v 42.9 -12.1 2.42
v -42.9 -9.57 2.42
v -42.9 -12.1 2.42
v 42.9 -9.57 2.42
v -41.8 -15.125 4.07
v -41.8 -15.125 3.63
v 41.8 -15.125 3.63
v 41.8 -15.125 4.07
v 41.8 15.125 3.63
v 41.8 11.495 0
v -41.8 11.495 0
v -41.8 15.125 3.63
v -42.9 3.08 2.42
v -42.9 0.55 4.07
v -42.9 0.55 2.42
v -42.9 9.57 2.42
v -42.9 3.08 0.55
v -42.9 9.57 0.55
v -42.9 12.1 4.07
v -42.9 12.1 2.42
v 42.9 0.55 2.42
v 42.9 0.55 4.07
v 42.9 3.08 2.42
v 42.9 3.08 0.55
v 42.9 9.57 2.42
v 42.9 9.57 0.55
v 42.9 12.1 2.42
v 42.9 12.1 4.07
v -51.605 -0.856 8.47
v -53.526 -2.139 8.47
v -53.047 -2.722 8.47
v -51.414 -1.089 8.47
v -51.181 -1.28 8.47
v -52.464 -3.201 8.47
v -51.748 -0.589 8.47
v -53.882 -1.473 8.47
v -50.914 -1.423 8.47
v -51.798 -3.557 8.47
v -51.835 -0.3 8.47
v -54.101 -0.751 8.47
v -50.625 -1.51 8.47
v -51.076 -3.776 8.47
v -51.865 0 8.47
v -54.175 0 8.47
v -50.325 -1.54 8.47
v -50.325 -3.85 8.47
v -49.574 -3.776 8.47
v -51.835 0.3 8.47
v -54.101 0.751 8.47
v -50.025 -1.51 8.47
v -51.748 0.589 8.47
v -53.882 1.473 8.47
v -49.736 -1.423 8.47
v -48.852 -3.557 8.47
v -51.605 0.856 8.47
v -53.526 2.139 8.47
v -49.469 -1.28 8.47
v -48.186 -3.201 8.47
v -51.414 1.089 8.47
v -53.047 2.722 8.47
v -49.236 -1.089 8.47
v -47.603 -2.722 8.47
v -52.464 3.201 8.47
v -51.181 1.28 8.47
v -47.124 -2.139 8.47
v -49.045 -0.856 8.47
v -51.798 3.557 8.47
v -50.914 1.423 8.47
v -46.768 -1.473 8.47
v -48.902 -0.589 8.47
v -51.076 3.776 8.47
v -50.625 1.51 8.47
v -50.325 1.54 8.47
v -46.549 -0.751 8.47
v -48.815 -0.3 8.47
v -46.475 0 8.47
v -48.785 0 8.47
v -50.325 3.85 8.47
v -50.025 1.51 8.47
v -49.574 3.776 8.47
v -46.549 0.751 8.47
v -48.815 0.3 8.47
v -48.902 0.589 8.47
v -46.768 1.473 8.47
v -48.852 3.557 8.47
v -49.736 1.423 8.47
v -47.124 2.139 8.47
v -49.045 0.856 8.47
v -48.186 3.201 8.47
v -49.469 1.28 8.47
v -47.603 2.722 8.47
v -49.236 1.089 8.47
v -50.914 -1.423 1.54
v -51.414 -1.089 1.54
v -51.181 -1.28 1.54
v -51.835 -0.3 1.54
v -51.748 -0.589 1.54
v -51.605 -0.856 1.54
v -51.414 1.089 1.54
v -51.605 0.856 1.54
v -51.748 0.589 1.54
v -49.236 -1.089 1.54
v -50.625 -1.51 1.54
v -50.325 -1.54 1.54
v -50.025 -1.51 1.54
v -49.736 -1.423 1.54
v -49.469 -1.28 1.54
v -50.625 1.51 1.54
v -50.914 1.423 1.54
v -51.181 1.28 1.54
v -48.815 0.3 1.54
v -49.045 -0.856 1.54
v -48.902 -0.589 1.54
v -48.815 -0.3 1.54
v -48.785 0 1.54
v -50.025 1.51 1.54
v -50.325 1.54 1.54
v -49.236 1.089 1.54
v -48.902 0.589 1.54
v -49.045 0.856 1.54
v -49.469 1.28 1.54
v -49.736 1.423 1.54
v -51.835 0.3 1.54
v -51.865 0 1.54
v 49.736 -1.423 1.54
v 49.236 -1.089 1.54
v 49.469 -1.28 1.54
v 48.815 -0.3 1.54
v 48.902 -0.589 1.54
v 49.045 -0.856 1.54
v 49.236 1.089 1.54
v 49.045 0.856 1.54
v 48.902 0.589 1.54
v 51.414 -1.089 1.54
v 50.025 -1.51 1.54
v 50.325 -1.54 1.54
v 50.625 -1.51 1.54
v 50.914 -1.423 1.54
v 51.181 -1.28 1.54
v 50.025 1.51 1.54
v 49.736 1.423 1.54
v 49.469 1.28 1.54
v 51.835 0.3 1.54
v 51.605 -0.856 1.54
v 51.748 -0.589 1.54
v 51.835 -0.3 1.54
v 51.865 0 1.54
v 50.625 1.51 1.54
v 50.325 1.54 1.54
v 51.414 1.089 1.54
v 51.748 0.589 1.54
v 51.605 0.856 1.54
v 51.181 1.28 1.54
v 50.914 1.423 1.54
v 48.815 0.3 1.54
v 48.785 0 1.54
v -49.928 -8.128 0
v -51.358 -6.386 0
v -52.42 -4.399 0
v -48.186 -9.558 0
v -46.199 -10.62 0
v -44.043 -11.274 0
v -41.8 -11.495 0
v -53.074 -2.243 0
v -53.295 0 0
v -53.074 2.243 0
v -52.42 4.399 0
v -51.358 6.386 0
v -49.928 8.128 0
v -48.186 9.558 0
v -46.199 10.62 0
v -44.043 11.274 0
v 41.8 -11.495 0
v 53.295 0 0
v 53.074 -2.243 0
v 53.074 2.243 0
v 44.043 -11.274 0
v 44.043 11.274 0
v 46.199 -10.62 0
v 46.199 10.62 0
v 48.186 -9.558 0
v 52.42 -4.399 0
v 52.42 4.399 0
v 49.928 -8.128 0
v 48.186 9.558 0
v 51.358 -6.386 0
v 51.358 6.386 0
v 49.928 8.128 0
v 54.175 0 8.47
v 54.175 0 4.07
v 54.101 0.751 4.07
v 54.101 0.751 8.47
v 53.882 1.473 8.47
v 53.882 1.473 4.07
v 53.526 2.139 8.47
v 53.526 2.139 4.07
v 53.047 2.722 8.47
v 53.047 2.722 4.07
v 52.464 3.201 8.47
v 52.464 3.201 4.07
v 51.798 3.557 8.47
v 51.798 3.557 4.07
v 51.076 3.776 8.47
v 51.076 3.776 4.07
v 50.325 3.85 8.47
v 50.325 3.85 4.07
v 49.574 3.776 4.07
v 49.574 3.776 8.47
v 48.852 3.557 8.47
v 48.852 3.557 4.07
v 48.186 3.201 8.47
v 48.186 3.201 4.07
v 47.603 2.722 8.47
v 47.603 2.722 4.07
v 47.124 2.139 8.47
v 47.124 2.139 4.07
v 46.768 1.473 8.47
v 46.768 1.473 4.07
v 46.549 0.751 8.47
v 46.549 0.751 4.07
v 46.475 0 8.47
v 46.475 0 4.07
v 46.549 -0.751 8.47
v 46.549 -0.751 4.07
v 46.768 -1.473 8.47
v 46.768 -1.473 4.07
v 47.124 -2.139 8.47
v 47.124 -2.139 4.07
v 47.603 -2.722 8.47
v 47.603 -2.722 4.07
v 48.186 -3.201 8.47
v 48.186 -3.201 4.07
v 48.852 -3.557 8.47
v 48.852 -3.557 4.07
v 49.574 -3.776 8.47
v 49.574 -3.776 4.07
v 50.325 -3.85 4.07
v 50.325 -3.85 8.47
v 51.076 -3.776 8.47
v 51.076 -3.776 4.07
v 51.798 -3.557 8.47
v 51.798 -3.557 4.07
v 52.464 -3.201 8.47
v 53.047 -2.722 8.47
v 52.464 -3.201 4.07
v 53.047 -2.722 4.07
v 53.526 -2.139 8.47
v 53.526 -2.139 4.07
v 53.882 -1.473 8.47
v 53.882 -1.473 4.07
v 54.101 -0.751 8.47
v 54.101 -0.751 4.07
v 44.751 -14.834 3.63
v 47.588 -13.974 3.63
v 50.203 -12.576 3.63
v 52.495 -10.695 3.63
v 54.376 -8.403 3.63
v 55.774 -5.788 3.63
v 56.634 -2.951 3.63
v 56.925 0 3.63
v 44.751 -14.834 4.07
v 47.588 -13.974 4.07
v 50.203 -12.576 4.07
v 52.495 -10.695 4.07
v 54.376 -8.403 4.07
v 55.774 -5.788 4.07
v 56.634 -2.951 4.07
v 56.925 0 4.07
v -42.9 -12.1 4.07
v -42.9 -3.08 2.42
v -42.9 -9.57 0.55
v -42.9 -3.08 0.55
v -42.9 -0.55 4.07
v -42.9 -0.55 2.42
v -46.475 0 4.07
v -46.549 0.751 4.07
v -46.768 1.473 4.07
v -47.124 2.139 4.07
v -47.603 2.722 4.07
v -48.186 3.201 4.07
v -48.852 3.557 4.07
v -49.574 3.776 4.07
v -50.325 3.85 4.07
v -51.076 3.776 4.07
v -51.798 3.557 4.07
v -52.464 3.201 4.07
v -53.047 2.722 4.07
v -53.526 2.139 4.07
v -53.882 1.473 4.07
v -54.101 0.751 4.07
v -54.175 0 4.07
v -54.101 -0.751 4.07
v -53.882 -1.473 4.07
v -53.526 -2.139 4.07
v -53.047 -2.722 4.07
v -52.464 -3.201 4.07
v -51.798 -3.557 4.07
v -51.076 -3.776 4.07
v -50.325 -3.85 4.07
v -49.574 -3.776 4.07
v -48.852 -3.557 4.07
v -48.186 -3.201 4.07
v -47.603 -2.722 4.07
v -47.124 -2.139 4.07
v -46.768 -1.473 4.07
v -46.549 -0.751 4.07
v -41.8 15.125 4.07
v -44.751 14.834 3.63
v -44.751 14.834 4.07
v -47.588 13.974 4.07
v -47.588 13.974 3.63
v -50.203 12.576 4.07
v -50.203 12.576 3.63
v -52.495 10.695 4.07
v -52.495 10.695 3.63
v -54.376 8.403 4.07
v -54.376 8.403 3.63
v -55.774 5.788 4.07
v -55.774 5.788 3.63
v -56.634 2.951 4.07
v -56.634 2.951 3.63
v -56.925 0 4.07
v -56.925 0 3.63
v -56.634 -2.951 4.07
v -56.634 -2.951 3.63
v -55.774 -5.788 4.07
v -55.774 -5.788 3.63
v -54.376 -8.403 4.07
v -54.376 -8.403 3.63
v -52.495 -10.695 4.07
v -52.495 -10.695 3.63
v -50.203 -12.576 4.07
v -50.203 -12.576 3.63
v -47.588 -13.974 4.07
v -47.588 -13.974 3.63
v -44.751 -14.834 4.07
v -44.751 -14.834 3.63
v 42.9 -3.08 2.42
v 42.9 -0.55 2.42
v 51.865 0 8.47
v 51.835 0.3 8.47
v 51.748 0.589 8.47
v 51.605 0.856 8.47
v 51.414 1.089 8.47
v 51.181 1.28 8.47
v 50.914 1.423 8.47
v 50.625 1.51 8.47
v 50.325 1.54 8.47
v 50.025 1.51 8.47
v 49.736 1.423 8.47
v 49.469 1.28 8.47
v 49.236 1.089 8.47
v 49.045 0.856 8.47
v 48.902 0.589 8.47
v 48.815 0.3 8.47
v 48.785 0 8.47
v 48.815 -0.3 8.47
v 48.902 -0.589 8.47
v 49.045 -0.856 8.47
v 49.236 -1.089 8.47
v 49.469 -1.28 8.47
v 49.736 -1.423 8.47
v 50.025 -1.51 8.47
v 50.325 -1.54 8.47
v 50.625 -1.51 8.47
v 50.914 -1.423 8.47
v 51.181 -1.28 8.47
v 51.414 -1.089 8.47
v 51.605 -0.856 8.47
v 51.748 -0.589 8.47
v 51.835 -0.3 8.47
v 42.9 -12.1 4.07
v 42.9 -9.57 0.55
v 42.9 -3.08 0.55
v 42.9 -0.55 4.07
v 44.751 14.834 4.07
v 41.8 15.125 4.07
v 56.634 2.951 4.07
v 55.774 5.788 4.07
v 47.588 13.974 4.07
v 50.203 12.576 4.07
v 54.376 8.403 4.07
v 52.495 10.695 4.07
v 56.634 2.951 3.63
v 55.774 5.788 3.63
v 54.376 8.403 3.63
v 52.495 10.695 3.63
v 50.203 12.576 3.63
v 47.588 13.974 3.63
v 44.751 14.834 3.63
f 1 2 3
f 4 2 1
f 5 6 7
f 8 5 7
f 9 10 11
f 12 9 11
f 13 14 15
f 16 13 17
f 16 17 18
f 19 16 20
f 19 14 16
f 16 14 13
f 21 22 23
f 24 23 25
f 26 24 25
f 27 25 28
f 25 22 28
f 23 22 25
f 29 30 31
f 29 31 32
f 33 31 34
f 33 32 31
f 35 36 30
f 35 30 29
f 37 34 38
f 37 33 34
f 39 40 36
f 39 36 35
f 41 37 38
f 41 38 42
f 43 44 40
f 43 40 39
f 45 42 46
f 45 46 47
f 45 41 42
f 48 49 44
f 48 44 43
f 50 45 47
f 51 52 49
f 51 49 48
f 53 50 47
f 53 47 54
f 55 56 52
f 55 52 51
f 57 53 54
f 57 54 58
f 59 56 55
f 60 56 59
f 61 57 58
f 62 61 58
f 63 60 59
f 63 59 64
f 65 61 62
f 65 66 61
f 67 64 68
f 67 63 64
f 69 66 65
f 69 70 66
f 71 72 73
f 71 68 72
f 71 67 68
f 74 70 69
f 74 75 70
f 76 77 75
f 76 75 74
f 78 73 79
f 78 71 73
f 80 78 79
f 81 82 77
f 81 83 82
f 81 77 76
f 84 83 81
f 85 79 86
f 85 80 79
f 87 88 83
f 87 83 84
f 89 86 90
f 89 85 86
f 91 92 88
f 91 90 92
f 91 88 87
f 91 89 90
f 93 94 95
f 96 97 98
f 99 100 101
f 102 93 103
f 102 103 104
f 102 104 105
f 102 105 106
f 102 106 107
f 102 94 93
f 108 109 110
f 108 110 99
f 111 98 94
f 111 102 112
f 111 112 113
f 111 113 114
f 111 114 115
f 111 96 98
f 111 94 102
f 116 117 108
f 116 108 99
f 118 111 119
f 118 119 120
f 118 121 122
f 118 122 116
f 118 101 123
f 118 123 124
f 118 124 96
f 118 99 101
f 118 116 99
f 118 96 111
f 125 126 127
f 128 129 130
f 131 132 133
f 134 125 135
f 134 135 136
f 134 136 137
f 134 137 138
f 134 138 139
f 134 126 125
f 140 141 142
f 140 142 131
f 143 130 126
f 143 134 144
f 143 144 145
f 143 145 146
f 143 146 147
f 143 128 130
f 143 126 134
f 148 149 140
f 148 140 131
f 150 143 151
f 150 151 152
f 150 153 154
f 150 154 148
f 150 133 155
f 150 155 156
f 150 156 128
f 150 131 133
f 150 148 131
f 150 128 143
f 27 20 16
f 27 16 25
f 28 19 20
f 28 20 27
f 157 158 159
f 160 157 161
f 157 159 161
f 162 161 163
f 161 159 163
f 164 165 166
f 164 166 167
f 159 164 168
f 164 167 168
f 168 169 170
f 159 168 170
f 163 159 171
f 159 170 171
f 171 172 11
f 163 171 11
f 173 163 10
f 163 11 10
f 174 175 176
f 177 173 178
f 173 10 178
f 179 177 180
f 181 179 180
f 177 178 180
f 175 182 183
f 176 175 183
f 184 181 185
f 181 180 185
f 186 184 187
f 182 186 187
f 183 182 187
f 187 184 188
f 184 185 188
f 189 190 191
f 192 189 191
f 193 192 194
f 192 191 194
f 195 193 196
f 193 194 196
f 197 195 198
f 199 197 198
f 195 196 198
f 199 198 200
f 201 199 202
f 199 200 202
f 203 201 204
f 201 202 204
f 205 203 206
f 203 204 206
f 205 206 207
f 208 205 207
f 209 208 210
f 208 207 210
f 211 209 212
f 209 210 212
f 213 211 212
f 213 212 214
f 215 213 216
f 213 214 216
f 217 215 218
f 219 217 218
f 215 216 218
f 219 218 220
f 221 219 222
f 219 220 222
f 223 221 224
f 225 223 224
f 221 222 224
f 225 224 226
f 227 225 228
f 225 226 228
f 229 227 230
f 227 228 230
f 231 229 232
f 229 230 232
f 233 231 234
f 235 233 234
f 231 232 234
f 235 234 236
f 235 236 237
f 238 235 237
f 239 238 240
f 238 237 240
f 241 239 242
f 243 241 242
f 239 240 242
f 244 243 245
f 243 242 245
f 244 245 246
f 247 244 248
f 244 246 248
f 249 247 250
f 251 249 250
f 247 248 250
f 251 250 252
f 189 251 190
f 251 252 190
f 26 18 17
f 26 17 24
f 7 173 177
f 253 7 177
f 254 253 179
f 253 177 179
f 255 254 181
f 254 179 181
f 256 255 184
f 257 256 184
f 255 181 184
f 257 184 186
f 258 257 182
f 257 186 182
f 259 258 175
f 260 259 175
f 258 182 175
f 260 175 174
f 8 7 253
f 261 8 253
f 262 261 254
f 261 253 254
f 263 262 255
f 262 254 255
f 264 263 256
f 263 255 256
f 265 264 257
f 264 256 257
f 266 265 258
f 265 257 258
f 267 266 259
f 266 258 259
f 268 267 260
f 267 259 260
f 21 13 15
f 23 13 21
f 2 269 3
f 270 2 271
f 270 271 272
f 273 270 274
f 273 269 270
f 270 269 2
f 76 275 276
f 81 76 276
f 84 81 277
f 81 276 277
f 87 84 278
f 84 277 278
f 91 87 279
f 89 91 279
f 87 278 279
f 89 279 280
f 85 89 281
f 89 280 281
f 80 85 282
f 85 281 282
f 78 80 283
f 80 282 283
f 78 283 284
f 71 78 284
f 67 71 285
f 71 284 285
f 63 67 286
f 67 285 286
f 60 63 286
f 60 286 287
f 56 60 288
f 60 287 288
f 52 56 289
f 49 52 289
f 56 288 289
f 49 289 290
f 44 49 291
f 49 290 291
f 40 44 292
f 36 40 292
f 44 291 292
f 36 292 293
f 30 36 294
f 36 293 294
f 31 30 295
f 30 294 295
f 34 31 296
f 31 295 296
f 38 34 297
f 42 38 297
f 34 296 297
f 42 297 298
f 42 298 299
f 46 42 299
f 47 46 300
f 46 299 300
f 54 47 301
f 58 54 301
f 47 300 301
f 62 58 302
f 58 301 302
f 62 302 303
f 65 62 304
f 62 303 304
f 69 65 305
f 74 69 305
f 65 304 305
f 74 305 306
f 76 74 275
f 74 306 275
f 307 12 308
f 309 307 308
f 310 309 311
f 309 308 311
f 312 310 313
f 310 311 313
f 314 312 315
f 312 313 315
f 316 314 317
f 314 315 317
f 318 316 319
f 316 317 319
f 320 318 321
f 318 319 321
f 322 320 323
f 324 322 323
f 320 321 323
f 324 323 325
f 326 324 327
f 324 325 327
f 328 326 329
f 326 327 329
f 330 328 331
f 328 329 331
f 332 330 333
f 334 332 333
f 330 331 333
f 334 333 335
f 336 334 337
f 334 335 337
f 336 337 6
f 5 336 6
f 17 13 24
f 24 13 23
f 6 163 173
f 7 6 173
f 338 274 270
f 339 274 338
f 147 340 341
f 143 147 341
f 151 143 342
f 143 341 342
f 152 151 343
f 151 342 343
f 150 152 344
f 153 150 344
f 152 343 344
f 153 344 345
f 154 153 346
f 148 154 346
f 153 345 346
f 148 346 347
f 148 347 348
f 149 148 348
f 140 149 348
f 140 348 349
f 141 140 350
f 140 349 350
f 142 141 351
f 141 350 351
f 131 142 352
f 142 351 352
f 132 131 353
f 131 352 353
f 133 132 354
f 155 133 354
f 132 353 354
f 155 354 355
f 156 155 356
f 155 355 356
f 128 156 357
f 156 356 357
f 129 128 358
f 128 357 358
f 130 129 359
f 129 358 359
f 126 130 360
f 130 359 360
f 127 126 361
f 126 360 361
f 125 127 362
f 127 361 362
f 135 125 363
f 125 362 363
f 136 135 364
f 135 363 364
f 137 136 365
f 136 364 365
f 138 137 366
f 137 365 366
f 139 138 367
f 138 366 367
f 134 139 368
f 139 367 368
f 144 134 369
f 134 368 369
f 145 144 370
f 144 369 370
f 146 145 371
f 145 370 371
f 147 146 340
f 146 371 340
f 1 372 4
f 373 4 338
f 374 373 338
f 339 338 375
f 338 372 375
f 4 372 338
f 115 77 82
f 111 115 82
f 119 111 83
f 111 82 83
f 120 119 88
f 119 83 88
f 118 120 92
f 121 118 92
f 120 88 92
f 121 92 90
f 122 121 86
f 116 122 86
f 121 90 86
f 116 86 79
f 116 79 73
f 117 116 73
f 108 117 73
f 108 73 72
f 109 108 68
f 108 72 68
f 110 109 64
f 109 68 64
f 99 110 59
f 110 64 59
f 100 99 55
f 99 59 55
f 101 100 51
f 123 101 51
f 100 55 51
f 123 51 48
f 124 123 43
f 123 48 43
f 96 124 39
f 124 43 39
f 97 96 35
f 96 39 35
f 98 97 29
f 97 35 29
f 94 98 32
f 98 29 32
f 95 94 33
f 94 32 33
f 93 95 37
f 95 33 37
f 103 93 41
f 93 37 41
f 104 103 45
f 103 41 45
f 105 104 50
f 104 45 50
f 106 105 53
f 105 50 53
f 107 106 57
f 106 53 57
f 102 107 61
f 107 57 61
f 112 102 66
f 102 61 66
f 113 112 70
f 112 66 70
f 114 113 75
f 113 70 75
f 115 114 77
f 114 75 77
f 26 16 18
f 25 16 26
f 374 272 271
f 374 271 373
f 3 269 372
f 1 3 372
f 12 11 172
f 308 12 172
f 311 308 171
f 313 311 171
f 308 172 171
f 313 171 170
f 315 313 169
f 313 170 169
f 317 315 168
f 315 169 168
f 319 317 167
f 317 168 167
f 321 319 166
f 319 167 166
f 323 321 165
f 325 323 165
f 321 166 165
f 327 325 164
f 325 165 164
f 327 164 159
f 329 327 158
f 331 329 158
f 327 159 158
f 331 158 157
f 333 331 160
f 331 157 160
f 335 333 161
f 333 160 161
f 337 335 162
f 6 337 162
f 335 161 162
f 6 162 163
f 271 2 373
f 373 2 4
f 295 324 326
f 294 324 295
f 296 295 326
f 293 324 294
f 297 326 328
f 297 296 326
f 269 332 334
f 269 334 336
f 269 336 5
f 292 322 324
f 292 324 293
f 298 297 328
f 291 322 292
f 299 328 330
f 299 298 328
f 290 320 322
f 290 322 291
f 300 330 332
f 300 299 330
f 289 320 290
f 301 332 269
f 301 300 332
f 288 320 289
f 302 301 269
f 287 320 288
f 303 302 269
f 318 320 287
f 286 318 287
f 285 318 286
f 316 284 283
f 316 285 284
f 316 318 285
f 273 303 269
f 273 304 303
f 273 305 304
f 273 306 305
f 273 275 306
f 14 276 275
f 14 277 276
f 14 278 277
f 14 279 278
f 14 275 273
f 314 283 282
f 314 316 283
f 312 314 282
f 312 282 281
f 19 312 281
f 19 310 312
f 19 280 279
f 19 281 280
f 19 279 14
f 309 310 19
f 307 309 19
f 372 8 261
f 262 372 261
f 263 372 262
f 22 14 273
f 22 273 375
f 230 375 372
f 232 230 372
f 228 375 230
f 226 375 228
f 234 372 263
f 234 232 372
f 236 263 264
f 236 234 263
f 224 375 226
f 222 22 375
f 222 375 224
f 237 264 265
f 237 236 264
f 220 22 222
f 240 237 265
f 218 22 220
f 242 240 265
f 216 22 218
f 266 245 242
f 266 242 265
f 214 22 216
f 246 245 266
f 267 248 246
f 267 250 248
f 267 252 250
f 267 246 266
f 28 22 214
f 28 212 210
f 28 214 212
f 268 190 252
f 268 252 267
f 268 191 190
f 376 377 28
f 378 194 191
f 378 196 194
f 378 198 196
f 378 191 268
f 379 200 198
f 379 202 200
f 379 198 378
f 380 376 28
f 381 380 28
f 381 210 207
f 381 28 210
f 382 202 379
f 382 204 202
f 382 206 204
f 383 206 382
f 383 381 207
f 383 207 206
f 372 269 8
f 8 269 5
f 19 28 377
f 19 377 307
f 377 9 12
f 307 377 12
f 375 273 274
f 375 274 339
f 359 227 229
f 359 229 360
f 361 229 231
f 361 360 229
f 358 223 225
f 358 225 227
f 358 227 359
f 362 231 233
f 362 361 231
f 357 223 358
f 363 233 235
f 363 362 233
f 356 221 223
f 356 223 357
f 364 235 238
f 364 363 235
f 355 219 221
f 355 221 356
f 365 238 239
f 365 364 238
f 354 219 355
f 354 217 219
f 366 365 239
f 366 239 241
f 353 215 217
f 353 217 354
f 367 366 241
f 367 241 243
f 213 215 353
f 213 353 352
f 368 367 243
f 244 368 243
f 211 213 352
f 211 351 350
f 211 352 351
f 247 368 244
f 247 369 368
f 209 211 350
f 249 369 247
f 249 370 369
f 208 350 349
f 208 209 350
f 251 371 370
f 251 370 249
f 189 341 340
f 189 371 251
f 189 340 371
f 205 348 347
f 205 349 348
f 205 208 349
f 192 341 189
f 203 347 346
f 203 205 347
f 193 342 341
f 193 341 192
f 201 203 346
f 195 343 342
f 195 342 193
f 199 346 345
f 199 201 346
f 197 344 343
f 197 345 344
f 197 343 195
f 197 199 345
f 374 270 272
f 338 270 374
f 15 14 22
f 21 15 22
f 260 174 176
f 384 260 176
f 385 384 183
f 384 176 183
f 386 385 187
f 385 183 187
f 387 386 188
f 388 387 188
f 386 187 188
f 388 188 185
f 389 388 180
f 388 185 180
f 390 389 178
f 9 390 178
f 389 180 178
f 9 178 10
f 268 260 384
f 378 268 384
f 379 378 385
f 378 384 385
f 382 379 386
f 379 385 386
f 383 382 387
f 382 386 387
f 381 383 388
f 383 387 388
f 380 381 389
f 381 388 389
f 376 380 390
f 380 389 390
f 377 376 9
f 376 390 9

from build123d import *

# Parameters (mm, degrees)
F1_DEPTH  = 3.7
F2_W      = 78
F2_H      = 2.3
F3_DEPTH  = 1.5
F2_H_2    = 5.9
F4_DEPTH  = 3.2
F2_R      = 3.5
F5_DEPTH  = 4
F6_R      = 1.4
F7_DEPTH  = 6.3
F8_R      = 1.4
F9_DEPTH  = 6.3
F10_SIZE  = 3.3
F11_SCALE = 1.1


with BuildPart() as f1:
    # F0 (on Top) → F1 (new body)
    with BuildSketch(Plane.XY):
        with BuildLine():
            ThreePointArc((38, -13.75), (24.25, 0), (38, 13.75))
            Line((38, 13.75), (-38, 13.75))
            ThreePointArc((-38, 13.75), (-28.2772817587, 9.7227182413), (-24.25, 0))
            ThreePointArc((-24.25, 0), (-28.2772817587, -9.7227182413), (-38, -13.75))
            Line((-38, -13.75), (38, -13.75))
        make_face()
        with BuildLine():
            ThreePointArc((-24.25, 0), (-28.2772817587, 9.7227182413), (-38, 13.75))
            Line((-38, 13.75), (-38, -13.75))
            ThreePointArc((-38, -13.75), (-28.2772817587, -9.7227182413), (-24.25, 0))
        make_face()
        with BuildLine():
            Line((-38, -13.75), (-38, 13.75))
            ThreePointArc((-38, 13.75), (-51.75, 0), (-38, -13.75))
        make_face()
        with BuildLine():
            Line((38, -13.75), (38, 13.75))
            ThreePointArc((38, 13.75), (24.25, 0), (38, -13.75))
        make_face()
        with BuildLine():
            ThreePointArc((51.75, 0), (47.7227182413, 9.7227182413), (38, 13.75))
            Line((38, 13.75), (38, -13.75))
            ThreePointArc((38, -13.75), (47.7227182413, -9.7227182413), (51.75, 0))
        make_face()
    extrude(amount=F1_DEPTH)

    # F2 (on face) → F3 (cut)
    with BuildSketch(Plane.XY.offset(3.7)):
        with Locations((0, 9.85)):
            Rectangle(F2_W, F2_H)
        with Locations((0, 1.65)):
            Rectangle(F2_W, F2_H)
        with Locations((0, -1.65)):
            Rectangle(F2_W, F2_H)
        with Locations((0, -9.85)):
            Rectangle(F2_W, F2_H)
    extrude(amount=-F3_DEPTH, mode=Mode.SUBTRACT)

    # F2 (on face) → F4 (cut)
    with BuildSketch(Plane.XY.offset(3.7)):
        with Locations((0, 5.75)):
            Rectangle(F2_W, F2_H_2)
        with Locations((0, -5.75)):
            Rectangle(F2_W, F2_H_2)
    extrude(amount=-F4_DEPTH, mode=Mode.SUBTRACT)

    # F2 (on face) → F5 (join)
    with BuildSketch(Plane.XY.offset(3.7)):
        with Locations((45.75, 0)):
            Circle(F2_R)
        with Locations((-45.75, 0)):
            Circle(F2_R)
    extrude(amount=F5_DEPTH)

    # F6 (on face) → F7 (cut)
    with BuildSketch(Plane.XY.offset(7.7)):
        with Locations((45.75, 0)):
            Circle(F6_R)
    extrude(amount=-F7_DEPTH, mode=Mode.SUBTRACT)

    # F8 (on face) → F9 (cut)
    with BuildSketch(Plane.XY.offset(7.7)):
        with Locations((-45.75, 0)):
            Circle(F8_R)
    extrude(amount=-F9_DEPTH, mode=Mode.SUBTRACT)

    # F10
    f10_edges = [f1.edges().sort_by_distance(p)[0] for p in [
        (0, 13.75, 0),
    ]]
    chamfer(f10_edges, length=F10_SIZE)


with BuildPart() as f1_1:
    # F11: moved
    add(f1.part.scale(F11_SCALE))


solid = f1_1.part
